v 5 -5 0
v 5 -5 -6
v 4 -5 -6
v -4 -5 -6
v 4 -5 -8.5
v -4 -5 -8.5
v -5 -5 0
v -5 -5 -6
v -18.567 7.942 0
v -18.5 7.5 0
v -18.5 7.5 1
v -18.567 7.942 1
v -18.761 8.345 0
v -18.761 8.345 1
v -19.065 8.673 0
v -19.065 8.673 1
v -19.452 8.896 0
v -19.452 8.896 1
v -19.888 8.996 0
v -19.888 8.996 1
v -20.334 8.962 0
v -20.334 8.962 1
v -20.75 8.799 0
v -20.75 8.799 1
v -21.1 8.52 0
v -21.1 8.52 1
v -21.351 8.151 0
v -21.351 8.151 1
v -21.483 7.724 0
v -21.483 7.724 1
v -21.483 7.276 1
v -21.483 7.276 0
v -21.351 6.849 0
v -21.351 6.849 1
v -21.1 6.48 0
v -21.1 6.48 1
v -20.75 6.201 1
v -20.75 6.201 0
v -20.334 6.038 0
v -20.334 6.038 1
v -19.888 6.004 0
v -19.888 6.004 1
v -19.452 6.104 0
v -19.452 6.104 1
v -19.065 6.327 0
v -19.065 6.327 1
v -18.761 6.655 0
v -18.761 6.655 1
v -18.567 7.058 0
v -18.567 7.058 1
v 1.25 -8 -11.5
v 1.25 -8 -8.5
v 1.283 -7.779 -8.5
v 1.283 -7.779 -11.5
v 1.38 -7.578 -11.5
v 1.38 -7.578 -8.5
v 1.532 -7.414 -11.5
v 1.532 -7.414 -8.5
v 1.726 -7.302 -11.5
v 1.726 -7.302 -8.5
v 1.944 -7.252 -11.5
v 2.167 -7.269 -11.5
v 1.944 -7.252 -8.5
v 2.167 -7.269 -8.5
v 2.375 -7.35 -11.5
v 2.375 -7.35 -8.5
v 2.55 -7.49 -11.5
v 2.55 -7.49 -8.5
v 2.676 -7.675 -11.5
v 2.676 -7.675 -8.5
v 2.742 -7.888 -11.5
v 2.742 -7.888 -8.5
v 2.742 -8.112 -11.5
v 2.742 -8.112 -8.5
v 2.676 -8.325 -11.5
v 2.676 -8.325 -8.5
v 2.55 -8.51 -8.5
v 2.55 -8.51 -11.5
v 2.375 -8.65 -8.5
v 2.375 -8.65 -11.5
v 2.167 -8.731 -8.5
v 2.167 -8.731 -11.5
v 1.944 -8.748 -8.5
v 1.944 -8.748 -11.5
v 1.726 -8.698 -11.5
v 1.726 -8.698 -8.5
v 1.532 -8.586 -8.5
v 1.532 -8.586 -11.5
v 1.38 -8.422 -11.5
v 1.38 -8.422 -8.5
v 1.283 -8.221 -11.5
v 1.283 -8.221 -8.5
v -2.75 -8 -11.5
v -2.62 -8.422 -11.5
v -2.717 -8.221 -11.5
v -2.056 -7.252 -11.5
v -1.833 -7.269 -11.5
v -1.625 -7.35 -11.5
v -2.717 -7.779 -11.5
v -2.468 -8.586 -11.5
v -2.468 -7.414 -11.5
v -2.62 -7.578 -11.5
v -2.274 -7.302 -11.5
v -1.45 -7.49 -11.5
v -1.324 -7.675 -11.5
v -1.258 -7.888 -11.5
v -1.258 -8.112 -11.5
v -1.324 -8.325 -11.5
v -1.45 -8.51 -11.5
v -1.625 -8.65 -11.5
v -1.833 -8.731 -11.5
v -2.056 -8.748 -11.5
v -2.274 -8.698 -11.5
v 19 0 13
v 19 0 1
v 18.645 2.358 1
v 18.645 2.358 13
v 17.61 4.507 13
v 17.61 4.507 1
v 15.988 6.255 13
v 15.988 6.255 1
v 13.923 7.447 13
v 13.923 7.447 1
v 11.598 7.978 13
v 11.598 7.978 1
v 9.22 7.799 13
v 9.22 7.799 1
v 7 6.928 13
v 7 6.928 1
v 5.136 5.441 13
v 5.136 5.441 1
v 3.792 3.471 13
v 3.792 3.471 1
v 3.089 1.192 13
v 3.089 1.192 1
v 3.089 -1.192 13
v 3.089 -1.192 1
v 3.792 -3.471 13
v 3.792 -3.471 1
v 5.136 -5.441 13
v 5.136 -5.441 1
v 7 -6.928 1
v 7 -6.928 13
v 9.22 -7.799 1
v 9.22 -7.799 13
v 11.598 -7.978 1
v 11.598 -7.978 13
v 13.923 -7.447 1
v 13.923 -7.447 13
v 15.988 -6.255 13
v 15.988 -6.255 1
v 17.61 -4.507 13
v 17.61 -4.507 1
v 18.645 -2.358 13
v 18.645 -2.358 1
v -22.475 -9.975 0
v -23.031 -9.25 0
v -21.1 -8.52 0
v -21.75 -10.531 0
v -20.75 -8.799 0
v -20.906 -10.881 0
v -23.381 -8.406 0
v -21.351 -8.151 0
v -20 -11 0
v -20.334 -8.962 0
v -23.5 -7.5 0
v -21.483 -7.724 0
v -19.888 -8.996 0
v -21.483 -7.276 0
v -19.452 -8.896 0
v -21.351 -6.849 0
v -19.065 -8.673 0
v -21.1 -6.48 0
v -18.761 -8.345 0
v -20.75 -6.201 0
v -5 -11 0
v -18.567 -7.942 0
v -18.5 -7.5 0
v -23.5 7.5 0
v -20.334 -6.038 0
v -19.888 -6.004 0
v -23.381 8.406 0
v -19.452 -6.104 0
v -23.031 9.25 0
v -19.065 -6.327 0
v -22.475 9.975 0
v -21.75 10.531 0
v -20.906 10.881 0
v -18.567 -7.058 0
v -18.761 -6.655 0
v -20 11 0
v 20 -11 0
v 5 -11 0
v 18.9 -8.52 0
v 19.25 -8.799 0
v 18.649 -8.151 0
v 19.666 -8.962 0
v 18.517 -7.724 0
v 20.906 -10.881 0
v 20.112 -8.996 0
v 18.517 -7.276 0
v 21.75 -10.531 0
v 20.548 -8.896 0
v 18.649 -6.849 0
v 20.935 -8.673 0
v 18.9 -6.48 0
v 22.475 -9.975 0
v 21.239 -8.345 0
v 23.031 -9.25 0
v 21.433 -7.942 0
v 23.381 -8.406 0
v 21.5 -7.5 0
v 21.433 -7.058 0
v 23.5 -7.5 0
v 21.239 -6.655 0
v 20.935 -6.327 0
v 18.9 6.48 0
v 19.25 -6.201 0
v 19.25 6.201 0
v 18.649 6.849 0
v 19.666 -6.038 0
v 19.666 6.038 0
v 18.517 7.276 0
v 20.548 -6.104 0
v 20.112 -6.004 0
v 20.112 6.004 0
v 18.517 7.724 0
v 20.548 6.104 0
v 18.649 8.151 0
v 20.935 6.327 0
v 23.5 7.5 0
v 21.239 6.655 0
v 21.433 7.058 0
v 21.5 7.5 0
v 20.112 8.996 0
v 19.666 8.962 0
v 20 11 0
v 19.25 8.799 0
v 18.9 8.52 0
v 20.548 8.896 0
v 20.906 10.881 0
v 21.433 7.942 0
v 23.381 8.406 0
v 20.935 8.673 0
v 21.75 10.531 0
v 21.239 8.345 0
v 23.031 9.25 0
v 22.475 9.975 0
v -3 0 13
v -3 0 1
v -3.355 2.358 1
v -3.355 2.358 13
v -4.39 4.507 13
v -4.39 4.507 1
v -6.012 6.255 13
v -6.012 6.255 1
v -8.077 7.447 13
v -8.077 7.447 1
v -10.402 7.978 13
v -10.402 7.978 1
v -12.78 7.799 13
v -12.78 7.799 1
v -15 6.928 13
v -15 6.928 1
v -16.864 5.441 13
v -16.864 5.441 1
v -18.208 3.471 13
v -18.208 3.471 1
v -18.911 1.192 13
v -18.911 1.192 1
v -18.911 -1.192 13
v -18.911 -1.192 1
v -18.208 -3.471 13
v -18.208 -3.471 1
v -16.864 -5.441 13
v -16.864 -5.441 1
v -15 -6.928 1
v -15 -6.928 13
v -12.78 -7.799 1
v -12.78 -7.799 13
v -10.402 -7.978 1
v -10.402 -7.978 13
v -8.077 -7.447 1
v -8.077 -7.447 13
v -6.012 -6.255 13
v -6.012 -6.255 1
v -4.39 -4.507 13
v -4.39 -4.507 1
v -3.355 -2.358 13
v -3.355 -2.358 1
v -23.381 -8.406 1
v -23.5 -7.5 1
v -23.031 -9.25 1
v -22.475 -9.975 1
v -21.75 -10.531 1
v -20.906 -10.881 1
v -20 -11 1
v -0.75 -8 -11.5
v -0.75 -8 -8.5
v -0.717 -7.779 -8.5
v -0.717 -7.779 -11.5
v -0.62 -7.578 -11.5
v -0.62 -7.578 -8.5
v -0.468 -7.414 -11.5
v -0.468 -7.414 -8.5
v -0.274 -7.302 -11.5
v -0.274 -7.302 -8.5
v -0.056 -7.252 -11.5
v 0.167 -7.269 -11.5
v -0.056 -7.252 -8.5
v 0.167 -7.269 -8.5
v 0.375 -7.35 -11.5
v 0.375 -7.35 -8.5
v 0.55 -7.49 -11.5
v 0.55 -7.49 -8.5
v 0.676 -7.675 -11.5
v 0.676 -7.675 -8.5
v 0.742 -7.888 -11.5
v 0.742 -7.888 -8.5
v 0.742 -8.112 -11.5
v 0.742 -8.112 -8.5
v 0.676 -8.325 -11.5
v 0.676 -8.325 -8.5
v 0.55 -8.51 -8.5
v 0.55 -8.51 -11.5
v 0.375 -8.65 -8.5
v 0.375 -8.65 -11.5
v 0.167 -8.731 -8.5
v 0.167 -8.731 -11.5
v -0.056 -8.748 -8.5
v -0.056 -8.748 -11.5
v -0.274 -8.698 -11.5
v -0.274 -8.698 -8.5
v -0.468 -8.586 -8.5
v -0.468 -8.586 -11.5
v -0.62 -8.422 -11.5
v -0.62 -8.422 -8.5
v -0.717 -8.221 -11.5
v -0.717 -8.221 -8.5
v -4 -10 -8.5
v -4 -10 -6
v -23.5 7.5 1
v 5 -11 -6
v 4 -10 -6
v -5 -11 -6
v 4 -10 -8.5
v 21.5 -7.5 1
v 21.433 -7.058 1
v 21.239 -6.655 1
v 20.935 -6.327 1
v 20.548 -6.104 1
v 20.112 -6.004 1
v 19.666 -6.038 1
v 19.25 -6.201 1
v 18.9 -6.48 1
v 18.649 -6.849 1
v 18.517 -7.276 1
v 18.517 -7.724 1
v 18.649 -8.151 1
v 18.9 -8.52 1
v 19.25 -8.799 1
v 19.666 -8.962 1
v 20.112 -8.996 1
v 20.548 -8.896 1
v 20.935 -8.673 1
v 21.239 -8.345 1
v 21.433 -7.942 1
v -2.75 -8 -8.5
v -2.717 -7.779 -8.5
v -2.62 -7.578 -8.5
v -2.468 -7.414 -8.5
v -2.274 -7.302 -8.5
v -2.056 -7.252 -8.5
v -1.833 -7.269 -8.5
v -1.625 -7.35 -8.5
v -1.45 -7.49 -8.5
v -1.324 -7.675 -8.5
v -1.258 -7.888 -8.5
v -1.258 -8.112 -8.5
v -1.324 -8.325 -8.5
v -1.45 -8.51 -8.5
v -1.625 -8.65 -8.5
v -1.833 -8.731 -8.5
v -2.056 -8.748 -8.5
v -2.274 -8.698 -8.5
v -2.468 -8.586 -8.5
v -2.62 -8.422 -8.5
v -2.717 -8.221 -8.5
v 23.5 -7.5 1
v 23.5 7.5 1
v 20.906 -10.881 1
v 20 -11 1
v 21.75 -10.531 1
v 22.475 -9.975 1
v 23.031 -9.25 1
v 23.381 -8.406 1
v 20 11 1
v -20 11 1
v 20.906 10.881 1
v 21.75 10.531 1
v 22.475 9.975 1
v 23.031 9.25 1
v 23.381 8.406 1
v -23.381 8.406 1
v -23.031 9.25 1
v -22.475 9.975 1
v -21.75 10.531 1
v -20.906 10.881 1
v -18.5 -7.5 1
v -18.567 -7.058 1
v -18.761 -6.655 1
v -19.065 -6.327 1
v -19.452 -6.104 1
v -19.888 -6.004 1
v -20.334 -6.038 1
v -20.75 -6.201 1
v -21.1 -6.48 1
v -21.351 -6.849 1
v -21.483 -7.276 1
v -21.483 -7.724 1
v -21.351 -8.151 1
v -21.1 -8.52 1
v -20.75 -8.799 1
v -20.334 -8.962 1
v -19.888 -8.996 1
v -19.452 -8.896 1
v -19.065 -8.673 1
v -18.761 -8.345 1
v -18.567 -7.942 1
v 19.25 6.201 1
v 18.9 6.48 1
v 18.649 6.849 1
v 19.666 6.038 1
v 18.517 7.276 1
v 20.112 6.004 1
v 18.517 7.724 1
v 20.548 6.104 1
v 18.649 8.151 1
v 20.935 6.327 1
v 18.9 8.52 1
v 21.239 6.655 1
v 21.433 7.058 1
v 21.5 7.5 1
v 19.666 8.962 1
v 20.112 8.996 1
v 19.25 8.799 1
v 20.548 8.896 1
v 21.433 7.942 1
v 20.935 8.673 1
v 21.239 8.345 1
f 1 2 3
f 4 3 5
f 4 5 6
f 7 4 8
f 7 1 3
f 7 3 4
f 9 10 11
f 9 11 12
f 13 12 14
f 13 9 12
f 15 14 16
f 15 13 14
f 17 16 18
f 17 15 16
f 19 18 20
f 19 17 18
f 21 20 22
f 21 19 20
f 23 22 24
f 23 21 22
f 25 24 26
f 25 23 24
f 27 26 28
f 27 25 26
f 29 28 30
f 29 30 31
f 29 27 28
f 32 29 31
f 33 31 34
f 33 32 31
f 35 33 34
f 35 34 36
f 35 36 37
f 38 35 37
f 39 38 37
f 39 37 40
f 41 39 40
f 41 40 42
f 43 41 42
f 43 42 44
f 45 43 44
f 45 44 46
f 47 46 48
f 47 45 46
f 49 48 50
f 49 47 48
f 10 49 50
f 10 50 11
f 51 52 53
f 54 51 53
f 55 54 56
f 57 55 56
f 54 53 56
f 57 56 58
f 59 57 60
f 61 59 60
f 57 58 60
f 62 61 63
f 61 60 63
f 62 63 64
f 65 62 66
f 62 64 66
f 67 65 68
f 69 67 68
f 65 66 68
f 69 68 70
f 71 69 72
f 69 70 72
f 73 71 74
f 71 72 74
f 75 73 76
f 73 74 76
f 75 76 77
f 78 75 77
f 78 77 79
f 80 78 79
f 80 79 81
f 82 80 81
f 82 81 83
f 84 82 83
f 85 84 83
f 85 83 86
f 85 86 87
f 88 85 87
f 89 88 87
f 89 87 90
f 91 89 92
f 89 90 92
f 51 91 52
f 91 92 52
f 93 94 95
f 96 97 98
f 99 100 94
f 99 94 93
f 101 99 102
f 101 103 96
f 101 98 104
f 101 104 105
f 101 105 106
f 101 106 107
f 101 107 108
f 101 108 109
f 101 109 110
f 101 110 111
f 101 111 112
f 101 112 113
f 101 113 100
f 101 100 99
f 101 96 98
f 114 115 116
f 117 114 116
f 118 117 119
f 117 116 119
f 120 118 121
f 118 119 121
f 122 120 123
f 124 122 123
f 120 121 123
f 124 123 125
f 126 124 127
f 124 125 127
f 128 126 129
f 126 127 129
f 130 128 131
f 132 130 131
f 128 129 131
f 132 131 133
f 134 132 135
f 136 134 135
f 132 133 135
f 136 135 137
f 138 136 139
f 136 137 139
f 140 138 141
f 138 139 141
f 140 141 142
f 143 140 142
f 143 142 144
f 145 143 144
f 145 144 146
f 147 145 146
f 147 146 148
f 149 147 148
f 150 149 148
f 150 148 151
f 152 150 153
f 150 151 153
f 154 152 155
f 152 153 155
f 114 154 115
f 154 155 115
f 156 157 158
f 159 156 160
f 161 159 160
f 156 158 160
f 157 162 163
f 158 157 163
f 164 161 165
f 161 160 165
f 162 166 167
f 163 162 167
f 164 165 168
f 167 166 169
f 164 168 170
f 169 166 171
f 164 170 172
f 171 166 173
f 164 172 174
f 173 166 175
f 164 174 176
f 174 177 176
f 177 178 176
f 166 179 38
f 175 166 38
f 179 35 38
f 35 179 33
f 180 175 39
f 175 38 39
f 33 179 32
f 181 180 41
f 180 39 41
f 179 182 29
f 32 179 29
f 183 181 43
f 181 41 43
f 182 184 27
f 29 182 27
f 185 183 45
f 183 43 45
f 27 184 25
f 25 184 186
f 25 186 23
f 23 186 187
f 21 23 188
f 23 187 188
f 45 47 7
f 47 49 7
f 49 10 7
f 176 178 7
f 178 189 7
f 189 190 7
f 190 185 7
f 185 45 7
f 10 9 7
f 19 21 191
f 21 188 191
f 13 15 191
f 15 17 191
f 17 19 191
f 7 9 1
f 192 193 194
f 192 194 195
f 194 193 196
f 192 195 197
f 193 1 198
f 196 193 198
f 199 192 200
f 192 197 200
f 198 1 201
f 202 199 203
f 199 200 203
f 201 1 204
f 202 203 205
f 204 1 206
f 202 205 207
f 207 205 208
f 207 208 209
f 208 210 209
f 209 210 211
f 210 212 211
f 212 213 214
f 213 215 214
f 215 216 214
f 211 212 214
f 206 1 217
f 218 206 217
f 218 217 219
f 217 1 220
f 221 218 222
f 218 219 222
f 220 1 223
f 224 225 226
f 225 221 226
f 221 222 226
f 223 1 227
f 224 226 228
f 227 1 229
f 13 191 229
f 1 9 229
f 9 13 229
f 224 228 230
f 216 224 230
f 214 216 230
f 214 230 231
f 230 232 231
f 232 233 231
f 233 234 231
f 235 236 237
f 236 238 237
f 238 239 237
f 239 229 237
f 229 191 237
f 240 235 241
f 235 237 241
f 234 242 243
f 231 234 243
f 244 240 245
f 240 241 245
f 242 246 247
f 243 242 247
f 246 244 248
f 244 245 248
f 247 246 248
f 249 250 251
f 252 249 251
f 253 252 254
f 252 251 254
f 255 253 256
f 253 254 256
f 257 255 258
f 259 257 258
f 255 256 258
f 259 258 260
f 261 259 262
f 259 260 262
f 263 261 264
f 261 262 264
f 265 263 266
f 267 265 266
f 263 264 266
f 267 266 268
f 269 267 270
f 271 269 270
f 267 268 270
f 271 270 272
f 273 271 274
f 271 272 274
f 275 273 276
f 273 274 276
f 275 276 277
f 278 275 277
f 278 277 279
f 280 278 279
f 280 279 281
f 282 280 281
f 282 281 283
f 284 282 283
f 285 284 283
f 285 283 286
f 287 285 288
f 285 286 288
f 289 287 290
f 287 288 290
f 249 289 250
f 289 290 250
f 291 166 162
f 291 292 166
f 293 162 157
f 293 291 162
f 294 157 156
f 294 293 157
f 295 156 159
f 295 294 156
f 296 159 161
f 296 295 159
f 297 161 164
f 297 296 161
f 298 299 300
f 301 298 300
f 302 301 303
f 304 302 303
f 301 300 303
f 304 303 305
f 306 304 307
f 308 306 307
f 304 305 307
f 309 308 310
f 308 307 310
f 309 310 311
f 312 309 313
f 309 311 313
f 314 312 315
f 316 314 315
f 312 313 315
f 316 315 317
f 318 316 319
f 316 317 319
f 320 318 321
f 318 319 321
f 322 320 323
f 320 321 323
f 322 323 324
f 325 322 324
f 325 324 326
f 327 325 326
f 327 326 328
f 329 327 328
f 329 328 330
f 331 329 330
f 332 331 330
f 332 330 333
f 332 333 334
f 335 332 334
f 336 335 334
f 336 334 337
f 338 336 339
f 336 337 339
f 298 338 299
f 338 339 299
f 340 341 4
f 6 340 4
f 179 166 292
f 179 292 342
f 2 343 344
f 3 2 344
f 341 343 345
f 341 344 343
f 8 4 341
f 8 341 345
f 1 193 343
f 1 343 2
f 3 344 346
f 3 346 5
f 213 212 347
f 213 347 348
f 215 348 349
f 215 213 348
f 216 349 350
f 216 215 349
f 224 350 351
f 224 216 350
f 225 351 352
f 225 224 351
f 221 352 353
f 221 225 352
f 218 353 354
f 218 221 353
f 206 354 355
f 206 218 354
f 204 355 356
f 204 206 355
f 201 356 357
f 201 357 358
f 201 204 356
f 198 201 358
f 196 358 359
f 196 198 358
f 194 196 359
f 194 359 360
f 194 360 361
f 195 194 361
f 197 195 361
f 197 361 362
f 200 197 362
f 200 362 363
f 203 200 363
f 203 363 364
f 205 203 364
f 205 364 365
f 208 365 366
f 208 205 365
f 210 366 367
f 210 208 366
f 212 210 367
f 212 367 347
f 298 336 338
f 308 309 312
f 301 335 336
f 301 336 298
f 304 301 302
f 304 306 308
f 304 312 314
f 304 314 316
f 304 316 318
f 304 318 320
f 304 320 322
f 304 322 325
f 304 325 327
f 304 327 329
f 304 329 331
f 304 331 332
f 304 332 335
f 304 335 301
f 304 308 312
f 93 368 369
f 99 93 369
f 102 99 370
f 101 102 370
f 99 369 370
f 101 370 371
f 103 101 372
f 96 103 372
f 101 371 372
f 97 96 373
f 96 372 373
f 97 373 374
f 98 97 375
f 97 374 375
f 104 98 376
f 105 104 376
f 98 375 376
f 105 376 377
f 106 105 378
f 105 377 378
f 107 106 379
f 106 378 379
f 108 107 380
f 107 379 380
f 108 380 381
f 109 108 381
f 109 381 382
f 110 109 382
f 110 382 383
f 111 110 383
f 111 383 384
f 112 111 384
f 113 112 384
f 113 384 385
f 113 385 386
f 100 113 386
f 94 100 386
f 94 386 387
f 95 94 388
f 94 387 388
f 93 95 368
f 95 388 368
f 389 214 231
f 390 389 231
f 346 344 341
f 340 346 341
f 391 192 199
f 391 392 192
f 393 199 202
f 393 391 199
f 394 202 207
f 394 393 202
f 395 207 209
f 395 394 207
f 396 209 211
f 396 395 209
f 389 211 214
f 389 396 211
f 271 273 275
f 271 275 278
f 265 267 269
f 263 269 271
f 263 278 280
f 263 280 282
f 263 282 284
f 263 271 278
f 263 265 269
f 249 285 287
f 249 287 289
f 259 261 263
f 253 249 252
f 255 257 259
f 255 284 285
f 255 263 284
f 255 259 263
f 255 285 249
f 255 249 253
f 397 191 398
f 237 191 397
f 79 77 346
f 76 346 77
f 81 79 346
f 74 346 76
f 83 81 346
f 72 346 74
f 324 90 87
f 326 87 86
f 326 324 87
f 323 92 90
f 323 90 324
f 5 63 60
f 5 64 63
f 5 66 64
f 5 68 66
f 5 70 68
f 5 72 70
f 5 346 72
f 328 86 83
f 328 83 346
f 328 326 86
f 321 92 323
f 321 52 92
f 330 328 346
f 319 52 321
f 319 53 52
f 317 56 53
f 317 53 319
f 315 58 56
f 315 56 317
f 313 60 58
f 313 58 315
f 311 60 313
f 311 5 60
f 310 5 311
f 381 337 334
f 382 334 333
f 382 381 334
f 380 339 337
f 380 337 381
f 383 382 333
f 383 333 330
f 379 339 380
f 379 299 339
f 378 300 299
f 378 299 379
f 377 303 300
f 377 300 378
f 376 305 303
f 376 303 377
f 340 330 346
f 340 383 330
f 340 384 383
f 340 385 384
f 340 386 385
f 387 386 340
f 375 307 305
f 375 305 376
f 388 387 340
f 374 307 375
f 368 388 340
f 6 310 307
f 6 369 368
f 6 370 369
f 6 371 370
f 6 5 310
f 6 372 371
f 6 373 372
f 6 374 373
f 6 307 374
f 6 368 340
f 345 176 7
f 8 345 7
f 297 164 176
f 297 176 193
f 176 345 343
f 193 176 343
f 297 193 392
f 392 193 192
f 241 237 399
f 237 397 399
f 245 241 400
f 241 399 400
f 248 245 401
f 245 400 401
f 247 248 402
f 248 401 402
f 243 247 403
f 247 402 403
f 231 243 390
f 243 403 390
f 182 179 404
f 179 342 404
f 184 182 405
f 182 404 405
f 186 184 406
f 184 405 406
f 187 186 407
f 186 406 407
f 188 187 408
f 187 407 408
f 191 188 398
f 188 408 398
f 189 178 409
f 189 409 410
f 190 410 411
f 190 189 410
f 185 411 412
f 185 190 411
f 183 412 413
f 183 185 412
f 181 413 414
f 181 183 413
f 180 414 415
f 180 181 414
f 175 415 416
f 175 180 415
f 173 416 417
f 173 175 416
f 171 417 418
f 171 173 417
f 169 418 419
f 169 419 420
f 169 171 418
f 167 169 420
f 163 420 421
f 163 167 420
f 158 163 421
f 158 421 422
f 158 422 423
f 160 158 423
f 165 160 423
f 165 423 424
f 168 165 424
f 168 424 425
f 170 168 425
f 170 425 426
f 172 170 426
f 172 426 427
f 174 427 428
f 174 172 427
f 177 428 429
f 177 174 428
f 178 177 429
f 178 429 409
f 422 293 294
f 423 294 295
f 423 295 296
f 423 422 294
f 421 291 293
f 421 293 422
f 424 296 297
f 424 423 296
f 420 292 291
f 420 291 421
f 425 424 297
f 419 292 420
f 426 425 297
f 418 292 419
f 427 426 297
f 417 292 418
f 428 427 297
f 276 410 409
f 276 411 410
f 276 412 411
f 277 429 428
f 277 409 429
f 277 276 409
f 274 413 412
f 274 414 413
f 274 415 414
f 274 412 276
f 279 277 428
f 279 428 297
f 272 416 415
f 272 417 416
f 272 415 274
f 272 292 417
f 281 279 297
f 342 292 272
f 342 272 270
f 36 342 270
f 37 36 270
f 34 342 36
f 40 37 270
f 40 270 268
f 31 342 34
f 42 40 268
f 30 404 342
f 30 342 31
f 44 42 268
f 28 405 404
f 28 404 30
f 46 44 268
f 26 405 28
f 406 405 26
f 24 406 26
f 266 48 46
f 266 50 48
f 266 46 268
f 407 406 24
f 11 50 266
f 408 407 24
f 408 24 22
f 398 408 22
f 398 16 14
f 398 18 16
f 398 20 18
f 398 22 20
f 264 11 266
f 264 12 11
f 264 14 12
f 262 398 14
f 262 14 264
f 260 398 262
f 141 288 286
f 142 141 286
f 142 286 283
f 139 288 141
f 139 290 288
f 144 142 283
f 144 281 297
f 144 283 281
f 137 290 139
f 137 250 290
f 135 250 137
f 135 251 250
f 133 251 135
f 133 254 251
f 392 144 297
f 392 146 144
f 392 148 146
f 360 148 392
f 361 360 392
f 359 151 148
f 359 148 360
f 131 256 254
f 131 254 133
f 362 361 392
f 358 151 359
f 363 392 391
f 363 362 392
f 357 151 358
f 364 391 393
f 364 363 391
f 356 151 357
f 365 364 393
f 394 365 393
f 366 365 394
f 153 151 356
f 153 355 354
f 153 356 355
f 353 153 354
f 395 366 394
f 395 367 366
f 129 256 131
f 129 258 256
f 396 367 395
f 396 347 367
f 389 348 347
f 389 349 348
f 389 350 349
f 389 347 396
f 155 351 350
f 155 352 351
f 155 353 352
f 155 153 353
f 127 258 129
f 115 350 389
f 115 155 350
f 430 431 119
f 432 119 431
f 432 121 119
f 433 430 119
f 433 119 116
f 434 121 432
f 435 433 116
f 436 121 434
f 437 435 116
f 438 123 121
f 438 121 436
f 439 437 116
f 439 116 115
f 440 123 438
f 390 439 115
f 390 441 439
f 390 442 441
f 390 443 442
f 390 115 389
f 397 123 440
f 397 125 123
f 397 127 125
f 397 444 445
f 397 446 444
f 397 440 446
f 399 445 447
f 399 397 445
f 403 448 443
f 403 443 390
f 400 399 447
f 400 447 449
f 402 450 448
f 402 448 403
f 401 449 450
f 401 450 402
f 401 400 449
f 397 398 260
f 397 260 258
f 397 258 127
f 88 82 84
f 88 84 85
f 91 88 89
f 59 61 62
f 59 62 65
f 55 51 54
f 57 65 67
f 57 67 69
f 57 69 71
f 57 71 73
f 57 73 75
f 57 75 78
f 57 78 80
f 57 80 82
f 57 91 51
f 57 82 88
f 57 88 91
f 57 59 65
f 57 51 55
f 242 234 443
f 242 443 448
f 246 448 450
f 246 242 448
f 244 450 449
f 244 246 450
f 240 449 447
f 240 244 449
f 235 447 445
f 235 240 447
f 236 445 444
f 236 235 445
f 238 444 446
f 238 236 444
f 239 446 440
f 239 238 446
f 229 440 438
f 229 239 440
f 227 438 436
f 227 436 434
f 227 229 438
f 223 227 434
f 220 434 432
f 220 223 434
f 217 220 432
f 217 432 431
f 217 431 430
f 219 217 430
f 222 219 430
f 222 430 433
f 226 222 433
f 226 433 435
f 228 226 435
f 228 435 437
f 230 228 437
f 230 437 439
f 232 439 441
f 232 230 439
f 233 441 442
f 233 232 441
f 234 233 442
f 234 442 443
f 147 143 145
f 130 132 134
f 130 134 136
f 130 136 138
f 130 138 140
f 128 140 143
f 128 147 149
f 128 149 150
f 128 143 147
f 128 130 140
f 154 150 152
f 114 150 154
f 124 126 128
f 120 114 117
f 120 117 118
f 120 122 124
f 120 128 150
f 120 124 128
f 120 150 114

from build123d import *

# Parameters (mm, degrees)
SKETCH1_W           = 47
SKETCH1_H           = 22
SKETCH1_R           = 8
BOSS_EXTRUDE1_DEPTH = 1
BOSS_EXTRUDE2_START = 1
SKETCH1_3_R         = 8
BOSS_EXTRUDE2_DEPTH = 12
SKETCH2_3_R         = 1.5
CUT_EXTRUDE1_DEPTH  = 1
FILLET1_R           = 3.5
SKETCH3_W           = 10
SKETCH3_H           = 6
BOSS_EXTRUDE3_DEPTH = 6
SKETCH4_W           = 8
SKETCH4_H           = 5
BOSS_EXTRUDE4_DEPTH = 2.5
SKETCH5_R           = 0.75
BOSS_EXTRUDE5_DEPTH = 3


with BuildPart() as part:
    # Sketch1 → Boss-Extrude1 (new body)
    # profile 1 of 3: a face of its own
    with BuildSketch(Plane.XY):
        Rectangle(SKETCH1_W, SKETCH1_H)
        with Locations((-11, 0)):
            Circle(SKETCH1_R, mode=Mode.SUBTRACT)
        with Locations((11, 0)):
            Circle(SKETCH1_R, mode=Mode.SUBTRACT)
    # profile 2 of 3: a face of its own
    with BuildSketch(Plane.XY):
        with Locations((11, 0)):
            Circle(SKETCH1_R)
    # profile 3 of 3: a face of its own
    with BuildSketch(Plane.XY):
        with Locations((-11, 0)):
            Circle(SKETCH1_R)
    extrude(amount=BOSS_EXTRUDE1_DEPTH)

    # Sketch1<3> → Boss-Extrude2 (add)
    with BuildSketch(Plane.XY.offset(BOSS_EXTRUDE2_START)):
        with Locations((11, 0)):
            Circle(SKETCH1_3_R)
        with Locations((-11, 0)):
            Circle(SKETCH1_3_R)
    extrude(amount=BOSS_EXTRUDE2_DEPTH)

    # Sketch2<3> → Cut-Extrude1 (cut)
    with BuildSketch(Plane.XY):
        with Locations((20, 7.5)):
            Circle(SKETCH2_3_R)
        with Locations((-20, 7.5)):
            Circle(SKETCH2_3_R)
        with Locations((-20, -7.5)):
            Circle(SKETCH2_3_R)
        with Locations((20, -7.5)):
            Circle(SKETCH2_3_R)
    extrude(amount=CUT_EXTRUDE1_DEPTH, mode=Mode.SUBTRACT)

    # Fillet1
    fillet1_edges = [part.edges().sort_by_distance(p)[0] for p in [
        (-23.5, 11, 0.5),
        (23.5, 11, 0.5),
        (23.5, -11, 0.5),
        (-23.5, -11, 0.5),
    ]]
    fillet(fillet1_edges, radius=FILLET1_R)

    # Sketch3 → Boss-Extrude3 (add)
    with BuildSketch(Plane(origin=(0, 0, 0), x_dir=(-1, 0, 0), z_dir=(0, 0, -1))):
        with Locations((0, -8)):
            Rectangle(SKETCH3_W, SKETCH3_H)
    extrude(amount=BOSS_EXTRUDE3_DEPTH)

    # Sketch4 → Boss-Extrude4 (add)
    with BuildSketch(Plane(origin=(0, 0, -6), x_dir=(-1, 0, 0), z_dir=(0, 0, -1))):
        with Locations((0, -7.5)):
            Rectangle(SKETCH4_W, SKETCH4_H)
    extrude(amount=BOSS_EXTRUDE4_DEPTH)

    # Sketch5 → Boss-Extrude5 (add)
    with BuildSketch(Plane(origin=(0, 0, -8.5), x_dir=(-1, 0, 0), z_dir=(0, 0, -1))):
        with Locations((-2, -8)):
            Circle(SKETCH5_R)
        with Locations((0, -8)):
            Circle(SKETCH5_R)
        with Locations((2, -8)):
            Circle(SKETCH5_R)
    extrude(amount=BOSS_EXTRUDE5_DEPTH)


solid = part.part
